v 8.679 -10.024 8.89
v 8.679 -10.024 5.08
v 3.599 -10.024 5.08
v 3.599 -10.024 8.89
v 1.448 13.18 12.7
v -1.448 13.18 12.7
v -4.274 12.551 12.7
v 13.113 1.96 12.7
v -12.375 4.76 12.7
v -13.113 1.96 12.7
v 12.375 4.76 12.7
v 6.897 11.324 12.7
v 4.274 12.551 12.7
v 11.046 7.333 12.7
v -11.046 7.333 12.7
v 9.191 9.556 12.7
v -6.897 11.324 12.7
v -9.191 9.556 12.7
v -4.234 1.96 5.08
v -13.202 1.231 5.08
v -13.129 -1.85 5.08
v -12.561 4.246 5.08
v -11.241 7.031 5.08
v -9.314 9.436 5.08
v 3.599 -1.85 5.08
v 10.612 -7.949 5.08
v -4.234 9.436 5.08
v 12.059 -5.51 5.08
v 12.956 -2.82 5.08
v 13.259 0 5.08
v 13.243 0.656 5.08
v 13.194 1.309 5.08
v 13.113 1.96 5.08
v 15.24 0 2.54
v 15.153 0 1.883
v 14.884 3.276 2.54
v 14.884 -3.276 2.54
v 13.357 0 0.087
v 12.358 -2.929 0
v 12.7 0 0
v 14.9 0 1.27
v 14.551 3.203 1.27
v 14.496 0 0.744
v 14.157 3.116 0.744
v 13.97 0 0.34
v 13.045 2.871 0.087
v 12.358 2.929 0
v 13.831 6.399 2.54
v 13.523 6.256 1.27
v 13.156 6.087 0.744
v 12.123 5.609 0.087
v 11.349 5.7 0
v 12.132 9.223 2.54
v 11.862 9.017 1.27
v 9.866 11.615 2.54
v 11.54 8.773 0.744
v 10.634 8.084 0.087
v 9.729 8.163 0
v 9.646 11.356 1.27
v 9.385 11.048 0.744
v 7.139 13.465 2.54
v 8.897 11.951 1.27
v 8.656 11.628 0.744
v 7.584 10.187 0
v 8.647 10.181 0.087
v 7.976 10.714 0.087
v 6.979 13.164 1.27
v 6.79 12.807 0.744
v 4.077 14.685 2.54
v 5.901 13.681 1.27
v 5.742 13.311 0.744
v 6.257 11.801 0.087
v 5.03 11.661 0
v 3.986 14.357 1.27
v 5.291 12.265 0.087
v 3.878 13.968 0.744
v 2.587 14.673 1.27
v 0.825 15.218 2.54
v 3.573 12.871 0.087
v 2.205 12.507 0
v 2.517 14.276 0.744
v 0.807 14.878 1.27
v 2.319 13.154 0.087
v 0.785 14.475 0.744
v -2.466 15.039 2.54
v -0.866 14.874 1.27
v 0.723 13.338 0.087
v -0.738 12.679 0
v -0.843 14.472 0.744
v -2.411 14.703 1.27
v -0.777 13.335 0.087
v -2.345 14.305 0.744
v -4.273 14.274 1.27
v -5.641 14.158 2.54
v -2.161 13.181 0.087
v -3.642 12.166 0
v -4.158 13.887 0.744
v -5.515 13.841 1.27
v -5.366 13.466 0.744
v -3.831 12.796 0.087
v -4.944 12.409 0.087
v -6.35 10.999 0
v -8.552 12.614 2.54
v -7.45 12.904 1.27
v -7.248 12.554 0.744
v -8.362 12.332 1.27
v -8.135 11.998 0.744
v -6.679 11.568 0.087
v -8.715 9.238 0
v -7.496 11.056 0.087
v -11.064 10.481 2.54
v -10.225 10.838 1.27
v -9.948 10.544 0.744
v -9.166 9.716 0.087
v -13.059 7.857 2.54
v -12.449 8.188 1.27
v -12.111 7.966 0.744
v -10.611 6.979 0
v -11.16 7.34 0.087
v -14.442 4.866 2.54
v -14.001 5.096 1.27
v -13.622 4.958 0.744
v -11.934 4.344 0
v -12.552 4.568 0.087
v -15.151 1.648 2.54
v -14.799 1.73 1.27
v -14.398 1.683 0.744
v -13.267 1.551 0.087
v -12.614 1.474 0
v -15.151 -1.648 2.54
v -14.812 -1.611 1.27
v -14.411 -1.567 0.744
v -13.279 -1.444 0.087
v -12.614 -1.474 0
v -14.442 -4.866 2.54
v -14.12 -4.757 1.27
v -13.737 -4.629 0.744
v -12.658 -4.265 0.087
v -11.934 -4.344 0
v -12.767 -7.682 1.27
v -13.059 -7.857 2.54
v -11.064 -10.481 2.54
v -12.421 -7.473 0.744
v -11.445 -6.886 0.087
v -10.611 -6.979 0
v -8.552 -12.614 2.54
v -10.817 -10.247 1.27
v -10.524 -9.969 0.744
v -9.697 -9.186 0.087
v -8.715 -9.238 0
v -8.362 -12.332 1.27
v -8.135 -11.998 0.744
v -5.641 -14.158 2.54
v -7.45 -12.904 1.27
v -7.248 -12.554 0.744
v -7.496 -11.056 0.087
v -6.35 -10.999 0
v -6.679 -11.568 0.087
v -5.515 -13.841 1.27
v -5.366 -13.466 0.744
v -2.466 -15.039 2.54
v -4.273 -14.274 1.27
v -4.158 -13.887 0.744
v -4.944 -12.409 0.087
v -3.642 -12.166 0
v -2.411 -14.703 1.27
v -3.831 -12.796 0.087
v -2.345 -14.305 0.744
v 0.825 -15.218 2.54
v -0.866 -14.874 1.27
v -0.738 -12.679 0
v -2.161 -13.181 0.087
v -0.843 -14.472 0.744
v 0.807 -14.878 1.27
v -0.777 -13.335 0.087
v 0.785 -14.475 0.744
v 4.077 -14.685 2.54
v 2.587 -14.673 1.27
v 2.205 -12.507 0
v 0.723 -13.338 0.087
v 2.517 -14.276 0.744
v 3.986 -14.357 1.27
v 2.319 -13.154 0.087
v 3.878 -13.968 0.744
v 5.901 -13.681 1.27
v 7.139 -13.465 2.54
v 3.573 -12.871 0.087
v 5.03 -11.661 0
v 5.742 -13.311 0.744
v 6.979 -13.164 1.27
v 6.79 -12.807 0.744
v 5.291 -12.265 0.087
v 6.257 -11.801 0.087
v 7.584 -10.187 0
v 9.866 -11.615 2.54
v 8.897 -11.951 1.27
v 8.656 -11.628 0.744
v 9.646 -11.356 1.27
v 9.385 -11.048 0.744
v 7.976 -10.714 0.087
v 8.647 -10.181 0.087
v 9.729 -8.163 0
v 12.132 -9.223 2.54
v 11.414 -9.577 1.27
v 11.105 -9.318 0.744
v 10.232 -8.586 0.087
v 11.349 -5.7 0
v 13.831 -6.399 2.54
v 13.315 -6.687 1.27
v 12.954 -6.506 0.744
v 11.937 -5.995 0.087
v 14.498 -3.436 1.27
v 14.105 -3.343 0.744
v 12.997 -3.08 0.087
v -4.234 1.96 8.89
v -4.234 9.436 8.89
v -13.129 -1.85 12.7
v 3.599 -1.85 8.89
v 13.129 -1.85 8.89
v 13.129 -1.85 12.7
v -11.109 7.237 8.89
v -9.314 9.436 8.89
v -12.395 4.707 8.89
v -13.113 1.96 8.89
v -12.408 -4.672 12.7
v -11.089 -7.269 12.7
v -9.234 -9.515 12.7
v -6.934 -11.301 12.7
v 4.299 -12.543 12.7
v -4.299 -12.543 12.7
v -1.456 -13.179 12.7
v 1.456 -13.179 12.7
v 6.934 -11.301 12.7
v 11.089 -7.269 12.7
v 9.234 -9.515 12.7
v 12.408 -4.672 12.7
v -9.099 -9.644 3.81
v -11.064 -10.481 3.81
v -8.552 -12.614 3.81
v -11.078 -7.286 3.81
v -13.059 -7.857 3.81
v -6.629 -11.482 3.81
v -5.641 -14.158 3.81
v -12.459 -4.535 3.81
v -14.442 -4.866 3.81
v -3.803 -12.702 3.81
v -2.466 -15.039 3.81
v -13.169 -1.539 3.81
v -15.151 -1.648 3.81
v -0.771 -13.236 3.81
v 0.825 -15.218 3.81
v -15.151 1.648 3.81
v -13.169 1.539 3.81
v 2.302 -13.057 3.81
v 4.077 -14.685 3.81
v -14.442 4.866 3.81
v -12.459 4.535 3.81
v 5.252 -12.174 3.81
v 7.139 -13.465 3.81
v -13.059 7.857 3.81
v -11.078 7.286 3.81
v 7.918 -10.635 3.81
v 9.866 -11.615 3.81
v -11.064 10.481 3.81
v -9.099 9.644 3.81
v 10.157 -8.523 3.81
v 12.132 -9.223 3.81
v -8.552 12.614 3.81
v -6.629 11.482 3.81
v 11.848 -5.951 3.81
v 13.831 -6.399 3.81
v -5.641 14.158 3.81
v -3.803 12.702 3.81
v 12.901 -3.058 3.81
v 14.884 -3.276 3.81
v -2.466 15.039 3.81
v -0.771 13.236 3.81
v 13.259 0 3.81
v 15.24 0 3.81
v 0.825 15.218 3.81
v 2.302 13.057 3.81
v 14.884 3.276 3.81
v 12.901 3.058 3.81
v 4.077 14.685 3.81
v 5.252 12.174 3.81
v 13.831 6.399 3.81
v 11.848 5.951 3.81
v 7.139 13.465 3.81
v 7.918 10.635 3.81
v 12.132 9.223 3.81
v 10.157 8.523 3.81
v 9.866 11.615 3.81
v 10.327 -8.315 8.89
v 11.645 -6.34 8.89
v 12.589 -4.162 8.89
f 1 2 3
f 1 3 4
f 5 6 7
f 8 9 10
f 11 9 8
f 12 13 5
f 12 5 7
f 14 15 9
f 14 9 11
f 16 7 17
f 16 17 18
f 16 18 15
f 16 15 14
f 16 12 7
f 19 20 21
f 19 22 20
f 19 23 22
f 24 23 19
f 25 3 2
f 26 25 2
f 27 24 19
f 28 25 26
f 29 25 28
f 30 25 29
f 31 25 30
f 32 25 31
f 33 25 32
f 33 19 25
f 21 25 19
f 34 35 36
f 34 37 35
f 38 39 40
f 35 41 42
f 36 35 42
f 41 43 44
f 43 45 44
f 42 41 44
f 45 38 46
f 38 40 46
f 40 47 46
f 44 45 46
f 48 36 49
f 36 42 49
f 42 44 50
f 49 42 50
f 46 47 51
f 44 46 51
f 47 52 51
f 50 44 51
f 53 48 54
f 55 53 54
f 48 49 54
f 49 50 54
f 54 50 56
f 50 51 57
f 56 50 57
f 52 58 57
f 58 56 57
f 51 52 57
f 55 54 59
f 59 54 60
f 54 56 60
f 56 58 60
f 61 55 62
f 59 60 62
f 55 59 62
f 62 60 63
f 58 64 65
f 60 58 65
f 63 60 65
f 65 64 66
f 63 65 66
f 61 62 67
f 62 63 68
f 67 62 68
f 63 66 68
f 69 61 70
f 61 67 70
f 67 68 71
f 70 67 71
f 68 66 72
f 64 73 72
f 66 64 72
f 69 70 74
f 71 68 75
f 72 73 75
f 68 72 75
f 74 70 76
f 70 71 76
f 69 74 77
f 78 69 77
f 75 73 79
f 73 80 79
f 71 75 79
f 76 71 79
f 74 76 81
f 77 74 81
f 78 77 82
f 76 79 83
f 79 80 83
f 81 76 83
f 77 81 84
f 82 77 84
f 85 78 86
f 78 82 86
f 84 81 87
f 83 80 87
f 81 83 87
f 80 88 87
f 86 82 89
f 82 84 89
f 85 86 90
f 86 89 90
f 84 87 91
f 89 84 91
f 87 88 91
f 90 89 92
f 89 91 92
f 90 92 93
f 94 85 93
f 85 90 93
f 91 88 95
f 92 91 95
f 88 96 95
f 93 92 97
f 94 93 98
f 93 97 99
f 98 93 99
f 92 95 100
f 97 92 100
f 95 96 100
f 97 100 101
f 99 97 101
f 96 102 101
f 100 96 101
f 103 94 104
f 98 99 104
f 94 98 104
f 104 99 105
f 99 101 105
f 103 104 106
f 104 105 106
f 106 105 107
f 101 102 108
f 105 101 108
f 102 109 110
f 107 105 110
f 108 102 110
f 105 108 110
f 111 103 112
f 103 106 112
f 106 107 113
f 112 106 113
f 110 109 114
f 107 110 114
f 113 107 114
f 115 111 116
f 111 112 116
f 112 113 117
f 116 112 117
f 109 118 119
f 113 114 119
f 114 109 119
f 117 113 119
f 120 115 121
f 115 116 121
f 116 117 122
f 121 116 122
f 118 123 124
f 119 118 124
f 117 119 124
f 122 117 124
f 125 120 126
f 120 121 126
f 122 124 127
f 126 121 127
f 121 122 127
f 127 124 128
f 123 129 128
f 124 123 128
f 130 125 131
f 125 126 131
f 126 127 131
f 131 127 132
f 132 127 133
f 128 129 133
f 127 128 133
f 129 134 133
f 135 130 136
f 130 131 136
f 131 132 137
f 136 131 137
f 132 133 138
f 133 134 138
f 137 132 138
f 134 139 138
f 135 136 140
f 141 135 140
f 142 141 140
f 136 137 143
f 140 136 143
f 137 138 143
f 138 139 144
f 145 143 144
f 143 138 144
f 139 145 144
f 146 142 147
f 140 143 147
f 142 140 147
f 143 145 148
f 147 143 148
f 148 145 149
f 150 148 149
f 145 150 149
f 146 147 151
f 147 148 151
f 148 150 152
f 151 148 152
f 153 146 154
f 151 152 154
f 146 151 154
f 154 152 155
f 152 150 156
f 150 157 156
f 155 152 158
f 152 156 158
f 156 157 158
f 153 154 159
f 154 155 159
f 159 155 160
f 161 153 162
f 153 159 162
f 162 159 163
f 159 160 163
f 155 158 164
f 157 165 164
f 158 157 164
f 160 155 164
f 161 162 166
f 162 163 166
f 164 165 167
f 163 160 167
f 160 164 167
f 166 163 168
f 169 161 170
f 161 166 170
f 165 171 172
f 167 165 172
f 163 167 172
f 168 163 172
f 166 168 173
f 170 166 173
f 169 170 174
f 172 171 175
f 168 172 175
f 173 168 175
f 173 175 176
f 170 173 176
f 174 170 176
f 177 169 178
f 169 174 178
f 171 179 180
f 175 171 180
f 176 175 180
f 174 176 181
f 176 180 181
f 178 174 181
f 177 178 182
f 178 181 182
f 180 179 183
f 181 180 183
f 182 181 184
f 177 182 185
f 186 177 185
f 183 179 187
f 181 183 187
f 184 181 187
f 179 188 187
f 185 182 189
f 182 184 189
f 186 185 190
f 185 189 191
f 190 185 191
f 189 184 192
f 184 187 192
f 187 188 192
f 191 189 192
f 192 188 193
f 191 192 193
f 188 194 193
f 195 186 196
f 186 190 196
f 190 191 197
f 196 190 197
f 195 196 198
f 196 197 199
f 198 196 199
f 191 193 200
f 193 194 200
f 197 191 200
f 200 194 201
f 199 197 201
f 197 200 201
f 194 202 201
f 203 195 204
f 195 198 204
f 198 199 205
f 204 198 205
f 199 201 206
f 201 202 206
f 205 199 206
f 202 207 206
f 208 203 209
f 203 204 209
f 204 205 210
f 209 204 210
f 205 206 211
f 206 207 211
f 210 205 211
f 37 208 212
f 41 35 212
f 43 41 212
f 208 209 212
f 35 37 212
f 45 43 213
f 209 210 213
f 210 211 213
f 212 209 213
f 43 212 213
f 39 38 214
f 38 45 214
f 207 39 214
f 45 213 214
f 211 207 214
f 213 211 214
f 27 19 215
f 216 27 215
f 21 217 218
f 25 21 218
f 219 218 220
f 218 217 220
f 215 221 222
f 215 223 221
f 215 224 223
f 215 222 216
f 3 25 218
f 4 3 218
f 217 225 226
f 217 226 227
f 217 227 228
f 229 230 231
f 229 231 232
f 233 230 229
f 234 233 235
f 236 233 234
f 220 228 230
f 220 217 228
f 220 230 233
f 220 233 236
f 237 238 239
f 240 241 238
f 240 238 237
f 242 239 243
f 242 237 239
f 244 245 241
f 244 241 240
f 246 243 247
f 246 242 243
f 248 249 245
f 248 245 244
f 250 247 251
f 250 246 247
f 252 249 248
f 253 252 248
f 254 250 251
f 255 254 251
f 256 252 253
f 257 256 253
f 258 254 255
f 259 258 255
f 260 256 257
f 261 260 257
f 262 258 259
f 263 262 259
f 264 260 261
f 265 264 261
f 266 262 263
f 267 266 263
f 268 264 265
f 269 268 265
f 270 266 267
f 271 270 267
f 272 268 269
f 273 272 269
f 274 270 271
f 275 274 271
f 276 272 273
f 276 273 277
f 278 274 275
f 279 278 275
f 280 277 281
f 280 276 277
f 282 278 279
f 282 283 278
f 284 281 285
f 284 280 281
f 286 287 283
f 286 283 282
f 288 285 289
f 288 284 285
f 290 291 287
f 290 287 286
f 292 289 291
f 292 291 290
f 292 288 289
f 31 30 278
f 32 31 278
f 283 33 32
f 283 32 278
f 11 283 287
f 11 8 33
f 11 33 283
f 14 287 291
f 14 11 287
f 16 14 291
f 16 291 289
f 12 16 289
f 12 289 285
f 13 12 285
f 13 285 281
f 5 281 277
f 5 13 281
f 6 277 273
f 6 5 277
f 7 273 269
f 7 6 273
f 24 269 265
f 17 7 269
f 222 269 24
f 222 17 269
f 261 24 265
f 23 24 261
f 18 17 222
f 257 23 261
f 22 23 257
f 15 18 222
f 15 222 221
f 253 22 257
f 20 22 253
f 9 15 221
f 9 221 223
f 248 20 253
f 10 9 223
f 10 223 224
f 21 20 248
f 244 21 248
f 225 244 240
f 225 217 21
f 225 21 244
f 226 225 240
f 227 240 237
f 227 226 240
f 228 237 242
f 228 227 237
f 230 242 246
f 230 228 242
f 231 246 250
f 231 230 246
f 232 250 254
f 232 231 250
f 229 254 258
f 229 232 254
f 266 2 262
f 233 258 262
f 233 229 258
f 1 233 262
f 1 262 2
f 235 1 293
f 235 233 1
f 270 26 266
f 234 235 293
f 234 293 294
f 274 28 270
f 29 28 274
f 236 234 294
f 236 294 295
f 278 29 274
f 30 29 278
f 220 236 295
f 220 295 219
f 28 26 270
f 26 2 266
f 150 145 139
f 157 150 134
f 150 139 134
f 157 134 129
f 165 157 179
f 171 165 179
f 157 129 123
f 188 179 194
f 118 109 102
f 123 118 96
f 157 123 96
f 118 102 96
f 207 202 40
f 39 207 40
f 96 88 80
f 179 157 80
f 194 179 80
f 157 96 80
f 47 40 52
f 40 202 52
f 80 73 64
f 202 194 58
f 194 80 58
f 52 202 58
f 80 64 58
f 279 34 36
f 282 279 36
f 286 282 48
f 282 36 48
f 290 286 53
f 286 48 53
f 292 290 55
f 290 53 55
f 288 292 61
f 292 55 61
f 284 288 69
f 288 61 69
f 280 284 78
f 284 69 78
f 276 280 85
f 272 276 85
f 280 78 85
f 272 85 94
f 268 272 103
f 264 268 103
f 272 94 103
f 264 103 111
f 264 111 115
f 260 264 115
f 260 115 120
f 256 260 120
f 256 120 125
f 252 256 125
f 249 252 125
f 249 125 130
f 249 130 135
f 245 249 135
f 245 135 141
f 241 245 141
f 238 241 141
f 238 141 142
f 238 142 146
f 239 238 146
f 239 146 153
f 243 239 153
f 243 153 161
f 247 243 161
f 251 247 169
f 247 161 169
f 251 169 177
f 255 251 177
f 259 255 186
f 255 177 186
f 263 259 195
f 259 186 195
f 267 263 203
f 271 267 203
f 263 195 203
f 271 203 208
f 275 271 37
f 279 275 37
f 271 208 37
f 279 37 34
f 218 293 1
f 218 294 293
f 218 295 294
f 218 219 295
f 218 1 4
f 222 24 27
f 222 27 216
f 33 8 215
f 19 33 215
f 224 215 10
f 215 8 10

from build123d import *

# Parameters (mm, degrees)
F0_R      = 15.24
F1_DEPTH  = 12.7
F2_R      = 15.24
F2_R_2    = 13.2588
F3_DEPTH  = 8.89
F5_DEPTH  = 7.62
F6_W      = 4.4506016257
F6_H      = 3.81
F7_DEPTH  = 25.4
F8_W      = 3.7988447554
F8_H      = 3.81
F9_DEPTH  = 25.4
F10_R     = 2.54
F11_DEPTH = 5.08
F12_DEPTH = 5.08


with BuildPart() as f1:
    # F0 (on Top) → F1 (new body)
    with BuildSketch(Plane.XY):
        Circle(F0_R)
    extrude(amount=F1_DEPTH)

    # F2 (on face) → F3 (cut)
    with BuildSketch(Plane.XY.offset(12.7)):
        Circle(F2_R)
        Circle(F2_R_2, mode=Mode.SUBTRACT)
    extrude(amount=-F3_DEPTH, mode=Mode.SUBTRACT)

    # F4 (on face) → F5 (cut)
    with BuildSketch(Plane.XY.offset(12.7)):
        with BuildLine():
            Line((13.1291263807, -1.849815645), (13.2588, -1.849815645))
            Line((13.2588, -1.849815645), (13.2588, 0))
            ThreePointArc((13.2588, 0), (13.2263418657, -0.9271775946), (13.1291263807, -1.849815645))
        make_face()
        with BuildLine():
            Line((-13.2588, -1.849815645), (-13.1291263807, -1.849815645))
            ThreePointArc((-13.1291263807, -1.849815645), (-13.2263418657, -0.9271775946), (-13.2588, 0))
            Line((-13.2588, 0), (-13.2588, -1.849815645))
        make_face()
        with BuildLine():
            ThreePointArc((13.1131024069, 1.960184355), (13.2223254315, 0.9827958199), (13.2588, 0))
            Line((13.2588, 0), (13.2588, 1.960184355))
            Line((13.2588, 1.960184355), (13.1131024069, 1.960184355))
        make_face()
        with BuildLine():
            Line((-13.2588, 1.960184355), (-13.2588, 0))
            ThreePointArc((-13.2588, 0), (-13.2223254315, 0.9827958199), (-13.1131024069, 1.960184355))
            Line((-13.1131024069, 1.960184355), (-13.2588, 1.960184355))
        make_face()
        with BuildLine():
            Line((-13.2588, 0), (13.2588, 0))
            ThreePointArc((13.2588, 0), (13.2223254315, 0.9827958199), (13.1131024069, 1.960184355))
            Line((13.1131024069, 1.960184355), (-13.1131024069, 1.960184355))
            ThreePointArc((-13.1131024069, 1.960184355), (-13.2223254315, 0.9827958199), (-13.2588, 0))
        make_face()
        with BuildLine():
            Line((-13.1291263807, -1.849815645), (13.1291263807, -1.849815645))
            ThreePointArc((13.1291263807, -1.849815645), (13.2263418657, -0.9271775946), (13.2588, 0))
            Line((13.2588, 0), (-13.2588, 0))
            ThreePointArc((-13.2588, 0), (-13.2263418657, -0.9271775946), (-13.1291263807, -1.849815645))
        make_face()
    extrude(amount=-F5_DEPTH, mode=Mode.SUBTRACT)

    # F6 (on face) → F7 (cut)
    with BuildSketch(Plane(origin=(0, -1.849815645, 0), x_dir=(-1, 0, 0), z_dir=(0, 1, 0))):
        with Locations((-10.9038255678, 6.985)):
            Rectangle(F6_W, F6_H)
    extrude(amount=-F7_DEPTH, mode=Mode.SUBTRACT)

    # F8 (on face) → F9 (cut)
    with BuildSketch(Plane.XZ.offset(-1.960184355)):
        with Locations((-11.2136800292, 6.985)):
            Rectangle(F8_W, F8_H)
    extrude(amount=-F9_DEPTH, mode=Mode.SUBTRACT)

    # F10
    f10_edges = [f1.edges().sort_by_distance(p)[0] for p in [
        (-15.24, 0, 0),
    ]]
    fillet(f10_edges, radius=F10_R)

    # F11 (cut): a face of the model
    f11_faces = [f1.faces().sort_by_distance(p)[0] for p in [
        (-9.3142576516, 5.6981527388, 6.985),
    ]]
    extrude(f11_faces, amount=-F11_DEPTH, mode=Mode.SUBTRACT)

    # F12 (cut): a face of the model
    f12_faces = [f1.faces().sort_by_distance(p)[0] for p in [
        (8.6785247549, -5.9368681555, 6.985),
    ]]
    extrude(f12_faces, amount=-F12_DEPTH, mode=Mode.SUBTRACT)


solid = f1.part
